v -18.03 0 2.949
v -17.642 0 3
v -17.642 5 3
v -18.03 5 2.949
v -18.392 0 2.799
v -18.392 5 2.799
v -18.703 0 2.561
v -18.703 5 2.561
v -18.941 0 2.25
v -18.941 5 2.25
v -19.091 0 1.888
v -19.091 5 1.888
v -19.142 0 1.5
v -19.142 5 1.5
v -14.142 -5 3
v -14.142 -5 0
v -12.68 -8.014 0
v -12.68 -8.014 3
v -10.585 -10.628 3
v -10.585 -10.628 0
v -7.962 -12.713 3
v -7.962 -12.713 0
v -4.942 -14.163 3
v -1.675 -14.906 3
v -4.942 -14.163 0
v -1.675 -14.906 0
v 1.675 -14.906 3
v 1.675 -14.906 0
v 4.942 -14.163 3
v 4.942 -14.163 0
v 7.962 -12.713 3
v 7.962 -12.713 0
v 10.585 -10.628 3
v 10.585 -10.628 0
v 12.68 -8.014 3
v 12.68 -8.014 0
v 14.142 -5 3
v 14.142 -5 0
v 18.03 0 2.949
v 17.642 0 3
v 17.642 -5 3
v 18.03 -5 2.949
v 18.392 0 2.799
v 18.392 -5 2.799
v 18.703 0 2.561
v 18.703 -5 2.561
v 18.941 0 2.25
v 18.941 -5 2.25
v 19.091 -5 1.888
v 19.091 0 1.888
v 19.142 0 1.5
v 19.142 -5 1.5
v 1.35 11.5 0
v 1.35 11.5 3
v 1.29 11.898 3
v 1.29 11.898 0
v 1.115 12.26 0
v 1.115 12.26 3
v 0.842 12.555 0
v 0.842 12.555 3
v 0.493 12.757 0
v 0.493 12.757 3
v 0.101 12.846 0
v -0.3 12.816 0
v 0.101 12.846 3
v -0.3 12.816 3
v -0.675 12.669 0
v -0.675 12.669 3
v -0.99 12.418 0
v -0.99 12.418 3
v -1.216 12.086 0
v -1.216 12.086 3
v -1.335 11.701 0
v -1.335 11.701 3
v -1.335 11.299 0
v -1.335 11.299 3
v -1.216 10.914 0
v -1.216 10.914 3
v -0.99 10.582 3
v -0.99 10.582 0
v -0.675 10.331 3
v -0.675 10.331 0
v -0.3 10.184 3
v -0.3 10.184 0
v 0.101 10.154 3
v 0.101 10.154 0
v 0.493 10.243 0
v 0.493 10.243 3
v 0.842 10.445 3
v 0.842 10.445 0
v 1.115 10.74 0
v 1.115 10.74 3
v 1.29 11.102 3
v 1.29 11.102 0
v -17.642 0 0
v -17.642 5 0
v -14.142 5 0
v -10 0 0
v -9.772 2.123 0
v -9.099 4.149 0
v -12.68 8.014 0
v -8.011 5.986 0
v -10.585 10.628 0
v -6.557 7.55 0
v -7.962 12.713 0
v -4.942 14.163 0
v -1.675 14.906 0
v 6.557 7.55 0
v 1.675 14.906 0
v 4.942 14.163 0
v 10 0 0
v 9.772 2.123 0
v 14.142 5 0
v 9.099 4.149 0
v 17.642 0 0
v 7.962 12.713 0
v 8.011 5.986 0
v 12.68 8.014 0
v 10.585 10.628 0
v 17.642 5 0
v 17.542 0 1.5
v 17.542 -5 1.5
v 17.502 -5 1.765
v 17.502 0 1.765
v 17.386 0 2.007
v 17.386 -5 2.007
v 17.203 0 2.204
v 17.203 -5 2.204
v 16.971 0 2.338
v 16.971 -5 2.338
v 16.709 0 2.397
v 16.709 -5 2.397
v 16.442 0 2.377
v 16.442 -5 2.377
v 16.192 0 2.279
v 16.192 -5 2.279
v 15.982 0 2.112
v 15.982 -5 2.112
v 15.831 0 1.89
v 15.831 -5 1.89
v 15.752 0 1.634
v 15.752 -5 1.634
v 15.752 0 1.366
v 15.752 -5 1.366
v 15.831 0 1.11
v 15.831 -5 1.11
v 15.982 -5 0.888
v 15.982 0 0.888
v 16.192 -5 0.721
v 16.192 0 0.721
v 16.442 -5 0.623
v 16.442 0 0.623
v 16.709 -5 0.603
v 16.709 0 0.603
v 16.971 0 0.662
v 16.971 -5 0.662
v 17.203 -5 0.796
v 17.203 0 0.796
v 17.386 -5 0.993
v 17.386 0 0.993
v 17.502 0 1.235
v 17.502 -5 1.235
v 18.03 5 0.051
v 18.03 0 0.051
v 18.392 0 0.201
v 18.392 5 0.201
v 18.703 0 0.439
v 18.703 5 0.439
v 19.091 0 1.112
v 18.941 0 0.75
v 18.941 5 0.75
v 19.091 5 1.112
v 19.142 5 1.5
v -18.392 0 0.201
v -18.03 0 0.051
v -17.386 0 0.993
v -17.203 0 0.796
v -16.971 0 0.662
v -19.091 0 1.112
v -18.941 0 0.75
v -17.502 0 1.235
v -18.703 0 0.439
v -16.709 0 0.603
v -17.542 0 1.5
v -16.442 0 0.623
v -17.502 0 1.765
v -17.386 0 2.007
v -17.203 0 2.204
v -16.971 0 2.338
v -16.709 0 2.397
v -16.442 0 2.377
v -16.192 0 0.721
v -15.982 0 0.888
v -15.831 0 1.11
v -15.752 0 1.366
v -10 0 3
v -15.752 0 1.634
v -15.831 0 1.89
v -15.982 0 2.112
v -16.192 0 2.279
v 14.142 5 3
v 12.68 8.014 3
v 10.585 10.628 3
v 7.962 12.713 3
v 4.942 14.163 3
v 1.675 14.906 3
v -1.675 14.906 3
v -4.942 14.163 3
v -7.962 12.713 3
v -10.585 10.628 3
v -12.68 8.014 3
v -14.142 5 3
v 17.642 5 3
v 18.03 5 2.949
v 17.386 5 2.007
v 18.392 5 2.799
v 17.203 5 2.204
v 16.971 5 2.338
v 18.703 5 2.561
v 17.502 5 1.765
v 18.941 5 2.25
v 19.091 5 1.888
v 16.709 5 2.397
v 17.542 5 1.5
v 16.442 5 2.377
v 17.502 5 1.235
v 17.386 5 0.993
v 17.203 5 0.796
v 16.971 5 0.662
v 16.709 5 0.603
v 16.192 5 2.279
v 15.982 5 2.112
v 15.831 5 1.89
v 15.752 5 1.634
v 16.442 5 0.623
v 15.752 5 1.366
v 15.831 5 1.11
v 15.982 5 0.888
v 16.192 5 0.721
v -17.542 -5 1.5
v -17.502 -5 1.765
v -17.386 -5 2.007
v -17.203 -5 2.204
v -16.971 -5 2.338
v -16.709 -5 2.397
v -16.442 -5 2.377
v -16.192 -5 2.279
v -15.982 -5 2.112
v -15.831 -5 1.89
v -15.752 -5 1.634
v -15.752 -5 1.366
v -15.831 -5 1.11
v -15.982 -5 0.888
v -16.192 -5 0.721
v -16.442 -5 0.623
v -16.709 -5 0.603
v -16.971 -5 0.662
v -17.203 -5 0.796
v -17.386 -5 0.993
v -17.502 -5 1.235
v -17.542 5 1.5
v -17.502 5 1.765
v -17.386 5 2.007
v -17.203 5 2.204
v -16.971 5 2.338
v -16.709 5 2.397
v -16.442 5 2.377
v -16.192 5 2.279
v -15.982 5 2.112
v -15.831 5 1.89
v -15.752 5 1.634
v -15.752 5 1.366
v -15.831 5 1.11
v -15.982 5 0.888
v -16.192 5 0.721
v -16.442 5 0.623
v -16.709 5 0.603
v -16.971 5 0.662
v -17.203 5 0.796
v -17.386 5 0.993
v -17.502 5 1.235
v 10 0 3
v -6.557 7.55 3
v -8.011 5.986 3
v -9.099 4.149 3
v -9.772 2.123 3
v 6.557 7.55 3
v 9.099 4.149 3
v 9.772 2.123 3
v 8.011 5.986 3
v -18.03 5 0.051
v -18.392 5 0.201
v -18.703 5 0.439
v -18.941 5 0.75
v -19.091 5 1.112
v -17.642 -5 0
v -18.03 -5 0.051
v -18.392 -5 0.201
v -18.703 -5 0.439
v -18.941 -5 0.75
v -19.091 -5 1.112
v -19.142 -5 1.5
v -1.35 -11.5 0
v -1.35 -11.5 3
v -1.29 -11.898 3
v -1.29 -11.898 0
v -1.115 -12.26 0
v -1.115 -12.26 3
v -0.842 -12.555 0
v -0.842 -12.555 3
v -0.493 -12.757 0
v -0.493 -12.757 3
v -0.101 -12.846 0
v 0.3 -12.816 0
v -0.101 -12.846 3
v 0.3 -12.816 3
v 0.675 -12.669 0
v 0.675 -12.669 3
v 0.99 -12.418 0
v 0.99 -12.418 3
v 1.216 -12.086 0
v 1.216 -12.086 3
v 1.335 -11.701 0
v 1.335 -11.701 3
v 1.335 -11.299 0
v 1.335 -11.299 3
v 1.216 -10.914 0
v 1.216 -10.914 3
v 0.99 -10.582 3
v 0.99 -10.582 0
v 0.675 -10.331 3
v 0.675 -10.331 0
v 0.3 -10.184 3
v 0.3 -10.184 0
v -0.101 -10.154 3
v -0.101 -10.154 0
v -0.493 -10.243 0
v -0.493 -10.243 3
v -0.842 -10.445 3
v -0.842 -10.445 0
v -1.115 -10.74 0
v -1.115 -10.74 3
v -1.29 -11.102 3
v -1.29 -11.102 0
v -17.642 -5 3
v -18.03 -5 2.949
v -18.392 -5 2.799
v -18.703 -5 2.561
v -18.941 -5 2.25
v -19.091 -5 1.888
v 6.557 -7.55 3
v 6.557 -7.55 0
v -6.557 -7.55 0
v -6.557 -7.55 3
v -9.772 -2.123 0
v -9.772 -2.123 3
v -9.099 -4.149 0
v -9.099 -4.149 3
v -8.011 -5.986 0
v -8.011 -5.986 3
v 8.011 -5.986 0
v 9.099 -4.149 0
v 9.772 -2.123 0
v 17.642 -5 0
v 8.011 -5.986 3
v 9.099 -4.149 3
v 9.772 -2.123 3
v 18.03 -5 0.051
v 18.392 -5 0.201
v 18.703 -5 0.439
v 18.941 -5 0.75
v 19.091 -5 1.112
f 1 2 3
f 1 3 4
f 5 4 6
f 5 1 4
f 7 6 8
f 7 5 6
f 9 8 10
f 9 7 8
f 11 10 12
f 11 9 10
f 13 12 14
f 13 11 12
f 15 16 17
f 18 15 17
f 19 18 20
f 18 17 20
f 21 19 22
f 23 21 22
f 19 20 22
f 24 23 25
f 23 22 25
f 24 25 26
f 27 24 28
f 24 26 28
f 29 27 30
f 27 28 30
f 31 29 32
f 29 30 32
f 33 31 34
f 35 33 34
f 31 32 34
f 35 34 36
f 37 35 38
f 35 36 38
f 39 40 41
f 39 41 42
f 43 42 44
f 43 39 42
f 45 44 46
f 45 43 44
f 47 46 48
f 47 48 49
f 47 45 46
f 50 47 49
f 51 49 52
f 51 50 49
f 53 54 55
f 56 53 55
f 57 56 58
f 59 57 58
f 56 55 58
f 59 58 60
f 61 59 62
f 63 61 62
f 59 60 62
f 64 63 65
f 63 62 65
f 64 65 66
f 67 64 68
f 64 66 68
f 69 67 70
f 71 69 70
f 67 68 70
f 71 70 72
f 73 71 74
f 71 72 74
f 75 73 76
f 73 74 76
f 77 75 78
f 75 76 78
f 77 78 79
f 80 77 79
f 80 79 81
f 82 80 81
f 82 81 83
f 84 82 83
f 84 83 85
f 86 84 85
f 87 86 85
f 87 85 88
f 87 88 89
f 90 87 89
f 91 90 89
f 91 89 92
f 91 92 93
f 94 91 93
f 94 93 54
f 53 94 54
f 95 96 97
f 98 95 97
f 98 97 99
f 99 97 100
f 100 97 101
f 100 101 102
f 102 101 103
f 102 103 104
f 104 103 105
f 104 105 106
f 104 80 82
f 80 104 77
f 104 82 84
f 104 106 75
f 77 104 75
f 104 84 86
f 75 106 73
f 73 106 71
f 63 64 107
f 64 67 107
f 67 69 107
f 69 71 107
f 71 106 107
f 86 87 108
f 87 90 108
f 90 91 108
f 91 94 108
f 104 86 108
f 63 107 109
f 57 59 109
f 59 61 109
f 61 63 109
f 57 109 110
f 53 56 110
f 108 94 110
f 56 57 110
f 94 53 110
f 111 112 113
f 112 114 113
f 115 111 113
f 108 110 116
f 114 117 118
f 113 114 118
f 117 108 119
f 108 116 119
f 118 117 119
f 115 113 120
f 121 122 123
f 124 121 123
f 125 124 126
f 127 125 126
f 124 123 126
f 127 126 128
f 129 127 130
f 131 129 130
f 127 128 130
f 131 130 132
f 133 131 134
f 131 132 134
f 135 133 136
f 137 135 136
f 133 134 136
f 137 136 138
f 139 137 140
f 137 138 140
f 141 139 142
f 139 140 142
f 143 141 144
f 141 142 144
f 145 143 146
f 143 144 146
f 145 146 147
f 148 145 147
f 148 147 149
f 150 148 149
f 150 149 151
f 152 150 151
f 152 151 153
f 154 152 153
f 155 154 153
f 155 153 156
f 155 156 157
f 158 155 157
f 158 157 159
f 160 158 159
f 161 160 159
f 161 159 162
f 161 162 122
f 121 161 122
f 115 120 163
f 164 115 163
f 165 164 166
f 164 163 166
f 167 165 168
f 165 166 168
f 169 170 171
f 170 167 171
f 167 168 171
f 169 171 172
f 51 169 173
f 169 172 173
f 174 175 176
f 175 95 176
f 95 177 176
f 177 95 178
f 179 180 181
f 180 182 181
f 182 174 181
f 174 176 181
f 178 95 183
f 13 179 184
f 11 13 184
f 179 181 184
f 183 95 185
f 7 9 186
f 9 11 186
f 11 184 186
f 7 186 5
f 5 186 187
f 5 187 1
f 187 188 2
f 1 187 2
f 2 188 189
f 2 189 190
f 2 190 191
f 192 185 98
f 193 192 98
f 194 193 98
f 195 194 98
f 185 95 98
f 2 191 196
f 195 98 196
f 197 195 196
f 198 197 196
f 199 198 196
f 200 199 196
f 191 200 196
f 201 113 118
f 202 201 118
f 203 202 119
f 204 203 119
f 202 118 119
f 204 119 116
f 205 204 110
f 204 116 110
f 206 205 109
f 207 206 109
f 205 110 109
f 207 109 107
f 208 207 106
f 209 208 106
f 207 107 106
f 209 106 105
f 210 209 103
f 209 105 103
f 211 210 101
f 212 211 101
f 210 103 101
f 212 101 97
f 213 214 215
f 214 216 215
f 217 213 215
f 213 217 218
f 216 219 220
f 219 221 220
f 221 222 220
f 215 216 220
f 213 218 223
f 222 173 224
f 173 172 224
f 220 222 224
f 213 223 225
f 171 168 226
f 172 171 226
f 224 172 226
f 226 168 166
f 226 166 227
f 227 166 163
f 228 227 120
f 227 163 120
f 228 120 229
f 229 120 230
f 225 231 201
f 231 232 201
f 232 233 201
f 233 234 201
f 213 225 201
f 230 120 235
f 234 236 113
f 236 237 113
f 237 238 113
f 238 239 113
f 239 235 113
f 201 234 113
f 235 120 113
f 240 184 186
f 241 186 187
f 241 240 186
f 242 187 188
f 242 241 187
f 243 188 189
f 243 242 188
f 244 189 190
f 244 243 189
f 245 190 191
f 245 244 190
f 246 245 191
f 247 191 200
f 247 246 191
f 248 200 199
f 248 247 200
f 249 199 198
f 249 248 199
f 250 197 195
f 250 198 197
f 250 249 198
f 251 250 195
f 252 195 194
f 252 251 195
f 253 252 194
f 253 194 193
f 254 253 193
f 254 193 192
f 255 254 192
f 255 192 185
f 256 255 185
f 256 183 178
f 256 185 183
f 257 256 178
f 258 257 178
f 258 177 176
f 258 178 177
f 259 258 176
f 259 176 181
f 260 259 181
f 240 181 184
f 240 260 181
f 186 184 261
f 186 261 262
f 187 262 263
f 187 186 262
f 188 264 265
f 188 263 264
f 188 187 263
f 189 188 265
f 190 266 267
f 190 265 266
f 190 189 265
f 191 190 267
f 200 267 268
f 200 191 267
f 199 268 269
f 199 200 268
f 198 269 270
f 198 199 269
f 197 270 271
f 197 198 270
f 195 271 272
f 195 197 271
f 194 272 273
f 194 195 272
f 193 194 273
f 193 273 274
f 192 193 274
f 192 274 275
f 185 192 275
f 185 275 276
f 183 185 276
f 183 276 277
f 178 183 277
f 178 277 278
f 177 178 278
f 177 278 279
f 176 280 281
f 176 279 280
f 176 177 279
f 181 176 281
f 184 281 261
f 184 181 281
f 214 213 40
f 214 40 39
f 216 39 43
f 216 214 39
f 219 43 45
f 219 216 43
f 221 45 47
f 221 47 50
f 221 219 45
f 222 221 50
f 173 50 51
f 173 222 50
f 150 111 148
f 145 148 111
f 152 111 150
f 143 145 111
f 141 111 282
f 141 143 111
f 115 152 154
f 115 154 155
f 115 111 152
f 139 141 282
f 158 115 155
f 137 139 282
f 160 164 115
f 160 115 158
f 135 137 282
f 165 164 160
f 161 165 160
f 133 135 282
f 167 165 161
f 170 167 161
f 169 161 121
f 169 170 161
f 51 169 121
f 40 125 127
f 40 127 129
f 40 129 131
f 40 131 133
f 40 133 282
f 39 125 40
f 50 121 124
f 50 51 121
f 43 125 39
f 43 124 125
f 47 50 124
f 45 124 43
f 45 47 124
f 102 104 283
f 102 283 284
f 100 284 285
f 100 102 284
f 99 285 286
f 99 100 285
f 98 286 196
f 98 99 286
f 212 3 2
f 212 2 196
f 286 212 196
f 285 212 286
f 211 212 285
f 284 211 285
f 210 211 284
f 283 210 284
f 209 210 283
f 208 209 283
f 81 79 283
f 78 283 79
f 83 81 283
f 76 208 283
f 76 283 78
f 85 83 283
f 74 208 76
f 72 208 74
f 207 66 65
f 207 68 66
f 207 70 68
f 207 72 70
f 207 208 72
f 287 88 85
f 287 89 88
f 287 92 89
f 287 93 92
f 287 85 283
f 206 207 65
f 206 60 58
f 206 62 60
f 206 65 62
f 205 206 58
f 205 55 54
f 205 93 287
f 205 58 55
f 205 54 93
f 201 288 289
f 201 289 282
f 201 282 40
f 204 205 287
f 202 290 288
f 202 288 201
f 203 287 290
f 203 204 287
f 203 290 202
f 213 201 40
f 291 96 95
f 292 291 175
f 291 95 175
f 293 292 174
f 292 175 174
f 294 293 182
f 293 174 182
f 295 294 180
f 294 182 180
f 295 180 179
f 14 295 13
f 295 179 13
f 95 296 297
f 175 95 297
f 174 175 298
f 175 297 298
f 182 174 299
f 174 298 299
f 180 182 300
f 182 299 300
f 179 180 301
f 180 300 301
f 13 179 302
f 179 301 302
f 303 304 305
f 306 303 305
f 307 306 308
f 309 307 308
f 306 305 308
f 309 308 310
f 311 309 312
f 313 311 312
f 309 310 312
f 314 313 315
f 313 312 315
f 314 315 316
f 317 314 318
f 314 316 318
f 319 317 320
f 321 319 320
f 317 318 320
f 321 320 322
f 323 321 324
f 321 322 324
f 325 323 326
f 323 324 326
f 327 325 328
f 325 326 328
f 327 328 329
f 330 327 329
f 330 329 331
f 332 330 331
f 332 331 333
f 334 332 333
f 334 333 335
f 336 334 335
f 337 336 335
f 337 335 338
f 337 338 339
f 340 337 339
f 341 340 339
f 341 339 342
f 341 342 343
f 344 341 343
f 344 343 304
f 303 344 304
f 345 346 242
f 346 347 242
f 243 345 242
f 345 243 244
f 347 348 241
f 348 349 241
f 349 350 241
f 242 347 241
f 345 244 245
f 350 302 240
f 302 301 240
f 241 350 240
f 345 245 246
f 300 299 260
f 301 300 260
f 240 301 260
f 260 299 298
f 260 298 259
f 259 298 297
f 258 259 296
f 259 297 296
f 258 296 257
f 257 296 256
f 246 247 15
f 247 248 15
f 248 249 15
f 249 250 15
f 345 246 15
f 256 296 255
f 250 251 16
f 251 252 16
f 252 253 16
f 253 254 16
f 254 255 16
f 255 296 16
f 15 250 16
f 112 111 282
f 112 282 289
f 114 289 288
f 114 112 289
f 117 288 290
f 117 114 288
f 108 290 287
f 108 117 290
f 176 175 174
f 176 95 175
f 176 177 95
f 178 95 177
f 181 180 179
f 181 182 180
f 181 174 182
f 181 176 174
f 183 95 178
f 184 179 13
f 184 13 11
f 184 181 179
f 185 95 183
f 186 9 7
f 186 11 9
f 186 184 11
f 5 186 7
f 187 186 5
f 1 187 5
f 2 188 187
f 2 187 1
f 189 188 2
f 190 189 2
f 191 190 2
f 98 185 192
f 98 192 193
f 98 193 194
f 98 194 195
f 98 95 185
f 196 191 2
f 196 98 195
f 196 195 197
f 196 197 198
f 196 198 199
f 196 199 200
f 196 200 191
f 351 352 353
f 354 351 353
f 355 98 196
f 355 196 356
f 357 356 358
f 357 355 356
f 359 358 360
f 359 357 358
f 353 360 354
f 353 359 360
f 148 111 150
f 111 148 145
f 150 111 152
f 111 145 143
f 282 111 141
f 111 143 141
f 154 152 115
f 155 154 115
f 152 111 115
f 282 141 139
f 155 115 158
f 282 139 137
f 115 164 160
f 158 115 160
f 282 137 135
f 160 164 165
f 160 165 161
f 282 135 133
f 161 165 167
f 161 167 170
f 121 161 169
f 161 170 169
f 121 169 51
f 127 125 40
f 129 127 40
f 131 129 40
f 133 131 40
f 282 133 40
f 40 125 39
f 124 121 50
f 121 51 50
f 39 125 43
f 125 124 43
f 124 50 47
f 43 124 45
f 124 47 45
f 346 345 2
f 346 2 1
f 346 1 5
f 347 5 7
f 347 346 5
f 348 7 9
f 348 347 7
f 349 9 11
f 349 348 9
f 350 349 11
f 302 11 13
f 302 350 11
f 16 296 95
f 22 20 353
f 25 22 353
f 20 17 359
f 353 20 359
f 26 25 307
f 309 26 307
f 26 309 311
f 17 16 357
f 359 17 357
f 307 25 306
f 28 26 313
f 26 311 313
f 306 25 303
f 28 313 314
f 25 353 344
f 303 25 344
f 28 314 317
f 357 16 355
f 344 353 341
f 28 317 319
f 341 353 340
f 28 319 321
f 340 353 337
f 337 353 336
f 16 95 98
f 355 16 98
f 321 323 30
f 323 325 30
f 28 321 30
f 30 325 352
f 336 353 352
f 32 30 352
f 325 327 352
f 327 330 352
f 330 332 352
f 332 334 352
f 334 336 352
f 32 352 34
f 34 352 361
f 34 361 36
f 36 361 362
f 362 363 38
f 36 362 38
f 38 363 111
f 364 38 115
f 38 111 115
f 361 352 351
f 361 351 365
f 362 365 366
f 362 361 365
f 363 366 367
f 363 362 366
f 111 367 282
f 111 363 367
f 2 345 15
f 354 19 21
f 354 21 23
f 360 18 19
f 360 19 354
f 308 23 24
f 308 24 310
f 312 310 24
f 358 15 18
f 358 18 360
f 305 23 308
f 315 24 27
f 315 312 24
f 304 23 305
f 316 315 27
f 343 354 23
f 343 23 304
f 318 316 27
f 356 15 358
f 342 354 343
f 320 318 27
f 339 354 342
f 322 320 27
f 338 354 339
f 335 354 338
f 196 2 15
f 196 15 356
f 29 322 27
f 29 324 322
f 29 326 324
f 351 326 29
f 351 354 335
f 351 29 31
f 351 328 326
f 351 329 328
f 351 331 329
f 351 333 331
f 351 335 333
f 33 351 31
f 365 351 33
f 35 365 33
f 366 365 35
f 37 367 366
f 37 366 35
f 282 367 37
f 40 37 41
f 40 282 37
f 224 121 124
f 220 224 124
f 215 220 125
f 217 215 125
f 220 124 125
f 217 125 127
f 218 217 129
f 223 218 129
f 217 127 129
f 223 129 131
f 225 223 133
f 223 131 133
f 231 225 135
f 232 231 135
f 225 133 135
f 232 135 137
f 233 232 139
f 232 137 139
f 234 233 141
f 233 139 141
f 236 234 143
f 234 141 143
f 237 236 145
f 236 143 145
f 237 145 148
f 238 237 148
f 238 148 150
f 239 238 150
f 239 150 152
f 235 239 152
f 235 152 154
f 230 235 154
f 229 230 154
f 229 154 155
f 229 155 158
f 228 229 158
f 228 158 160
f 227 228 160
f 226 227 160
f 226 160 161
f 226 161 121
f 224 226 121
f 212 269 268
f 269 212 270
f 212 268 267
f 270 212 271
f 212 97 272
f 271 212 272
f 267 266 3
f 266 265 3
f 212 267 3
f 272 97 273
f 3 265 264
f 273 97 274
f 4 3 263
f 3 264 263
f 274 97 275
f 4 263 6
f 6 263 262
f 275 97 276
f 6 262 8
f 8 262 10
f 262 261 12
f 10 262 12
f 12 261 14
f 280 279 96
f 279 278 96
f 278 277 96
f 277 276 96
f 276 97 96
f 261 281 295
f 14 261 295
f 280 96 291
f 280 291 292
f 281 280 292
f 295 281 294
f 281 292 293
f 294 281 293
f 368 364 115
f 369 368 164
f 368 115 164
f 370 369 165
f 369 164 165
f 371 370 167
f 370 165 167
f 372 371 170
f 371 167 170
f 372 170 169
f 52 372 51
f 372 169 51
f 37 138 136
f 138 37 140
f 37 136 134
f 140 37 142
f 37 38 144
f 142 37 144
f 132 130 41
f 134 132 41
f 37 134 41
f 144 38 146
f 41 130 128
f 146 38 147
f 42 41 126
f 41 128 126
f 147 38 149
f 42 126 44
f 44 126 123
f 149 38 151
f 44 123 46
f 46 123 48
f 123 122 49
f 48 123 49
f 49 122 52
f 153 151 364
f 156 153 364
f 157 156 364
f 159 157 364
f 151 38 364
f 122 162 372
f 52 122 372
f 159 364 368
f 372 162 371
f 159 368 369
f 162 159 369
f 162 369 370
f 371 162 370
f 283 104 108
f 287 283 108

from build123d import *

# Parameters (mm, degrees)
SKETCH1_R           = 15
SKETCH1_R_2         = 10
BOSS_EXTRUDE1_DEPTH = 3
SKETCH2_R           = 0.9
CUT_EXTRUDE1_DEPTH  = 28.846388567
SKETCH3_R           = 1.35
CUT_EXTRUDE2_DEPTH  = 25.503496817
FILLET2_R           = 1.5


with BuildPart() as part:
    # Sketch1 → Boss-Extrude1 (new body)
    # profile 1 of 7: a face of its own
    with BuildSketch(Plane.XY):
        Circle(SKETCH1_R)
        Circle(SKETCH1_R_2, mode=Mode.SUBTRACT)
    # profile 2 of 7: a face of its own
    with BuildSketch(Plane.XY):
        with BuildLine():
            ThreePointArc((6.557247898, 7.55), (0, 10), (-6.557247898, 7.55))
            Line((-6.557247898, 7.55), (6.557247898, 7.55))
        make_face()
    # profile 3 of 7: a face of its own
    with BuildSketch(Plane.XY):
        with BuildLine():
            Line((6.557247898, -7.55), (-6.557247898, -7.55))
            ThreePointArc((-6.557247898, -7.55), (0, -10), (6.557247898, -7.55))
        make_face()
    # profile 4 of 7: a face of its own
    with BuildSketch(Plane.XY):
        with BuildLine():
            Line((19.142135624, 5), (14.142135624, 5))
            ThreePointArc((14.142135624, 5), (14.783978395, 2.536529681), (15, 0))
            ThreePointArc((15, 0), (14.783978395, -2.536529681), (14.142135624, -5))
            Line((14.142135624, -5), (19.142135624, -5))
            Line((19.142135624, -5), (19.142135624, 5))
        make_face()
    # profile 5 of 7: a face of its own
    with BuildSketch(Plane.XY):
        with BuildLine():
            ThreePointArc((15, 0), (14.783978395, 2.536529681), (14.142135624, 5))
            Line((14.142135624, 5), (14.142135624, -5))
            ThreePointArc((14.142135624, -5), (14.783978395, -2.536529681), (15, 0))
        make_face()
    # profile 6 of 7: a face of its own
    with BuildSketch(Plane.XY):
        with BuildLine():
            Line((-14.142135624, -5), (-14.142135624, 5))
            ThreePointArc((-14.142135624, 5), (-15, 0), (-14.142135624, -5))
        make_face()
    # profile 7 of 7: a face of its own
    with BuildSketch(Plane.XY):
        with BuildLine():
            ThreePointArc((-14.142135624, -5), (-15, 0), (-14.142135624, 5))
            Line((-14.142135624, 5), (-19.142135624, 5))
            Line((-19.142135624, 5), (-19.142135624, -5))
            Line((-19.142135624, -5), (-14.142135624, -5))
        make_face()
    extrude(amount=BOSS_EXTRUDE1_DEPTH)

    # Sketch2 → Cut-Extrude1 (cut, through all)
    with BuildSketch(Plane.XZ.offset(5)):
        with Locations((16.642135624, 1.5)):
            Circle(SKETCH2_R)
    cut_extrude1 = extrude(amount=-CUT_EXTRUDE1_DEPTH, mode=Mode.SUBTRACT)

    # Mirror1: Cut-Extrude1 across plane
    add(cut_extrude1.mirror(Plane(origin=(0, 0, 0), x_dir=(0, 0, 1), z_dir=(1, 0, 0))), mode=Mode.SUBTRACT)

    # Sketch3 → Cut-Extrude2 (cut, through all)
    with BuildSketch(Plane.XY.offset(3)):
        with Locations((0, 11.5)):
            Circle(SKETCH3_R)
        with Locations(Location((0, -11.5, 0), (0, 0, 180))):
            Circle(SKETCH3_R)
    extrude(amount=-CUT_EXTRUDE2_DEPTH, mode=Mode.SUBTRACT)

    # Fillet2
    fillet2_edges = [part.edges().sort_by_distance(p)[0] for p in [
        (19.142135624, 0, 3),
        (19.142135624, 0, 0),
        (-19.142135624, 0, 3),
        (-19.142135624, 0, 0),
    ]]
    fillet(fillet2_edges, radius=FILLET2_R - 0.0001)  # a hair under: the kernel refuses the full size


with BuildPart() as body_2:
    # Split1: the piece on the far side of the plane
    add(part.part)
    split(bisect_by=Plane.ZX, keep=Keep.BOTTOM)


with BuildPart() as part_1:
    add(part.part)

    # Split1
    split(bisect_by=Plane.ZX, keep=Keep.TOP)


solid = Compound([body_2.part, part_1.part])
